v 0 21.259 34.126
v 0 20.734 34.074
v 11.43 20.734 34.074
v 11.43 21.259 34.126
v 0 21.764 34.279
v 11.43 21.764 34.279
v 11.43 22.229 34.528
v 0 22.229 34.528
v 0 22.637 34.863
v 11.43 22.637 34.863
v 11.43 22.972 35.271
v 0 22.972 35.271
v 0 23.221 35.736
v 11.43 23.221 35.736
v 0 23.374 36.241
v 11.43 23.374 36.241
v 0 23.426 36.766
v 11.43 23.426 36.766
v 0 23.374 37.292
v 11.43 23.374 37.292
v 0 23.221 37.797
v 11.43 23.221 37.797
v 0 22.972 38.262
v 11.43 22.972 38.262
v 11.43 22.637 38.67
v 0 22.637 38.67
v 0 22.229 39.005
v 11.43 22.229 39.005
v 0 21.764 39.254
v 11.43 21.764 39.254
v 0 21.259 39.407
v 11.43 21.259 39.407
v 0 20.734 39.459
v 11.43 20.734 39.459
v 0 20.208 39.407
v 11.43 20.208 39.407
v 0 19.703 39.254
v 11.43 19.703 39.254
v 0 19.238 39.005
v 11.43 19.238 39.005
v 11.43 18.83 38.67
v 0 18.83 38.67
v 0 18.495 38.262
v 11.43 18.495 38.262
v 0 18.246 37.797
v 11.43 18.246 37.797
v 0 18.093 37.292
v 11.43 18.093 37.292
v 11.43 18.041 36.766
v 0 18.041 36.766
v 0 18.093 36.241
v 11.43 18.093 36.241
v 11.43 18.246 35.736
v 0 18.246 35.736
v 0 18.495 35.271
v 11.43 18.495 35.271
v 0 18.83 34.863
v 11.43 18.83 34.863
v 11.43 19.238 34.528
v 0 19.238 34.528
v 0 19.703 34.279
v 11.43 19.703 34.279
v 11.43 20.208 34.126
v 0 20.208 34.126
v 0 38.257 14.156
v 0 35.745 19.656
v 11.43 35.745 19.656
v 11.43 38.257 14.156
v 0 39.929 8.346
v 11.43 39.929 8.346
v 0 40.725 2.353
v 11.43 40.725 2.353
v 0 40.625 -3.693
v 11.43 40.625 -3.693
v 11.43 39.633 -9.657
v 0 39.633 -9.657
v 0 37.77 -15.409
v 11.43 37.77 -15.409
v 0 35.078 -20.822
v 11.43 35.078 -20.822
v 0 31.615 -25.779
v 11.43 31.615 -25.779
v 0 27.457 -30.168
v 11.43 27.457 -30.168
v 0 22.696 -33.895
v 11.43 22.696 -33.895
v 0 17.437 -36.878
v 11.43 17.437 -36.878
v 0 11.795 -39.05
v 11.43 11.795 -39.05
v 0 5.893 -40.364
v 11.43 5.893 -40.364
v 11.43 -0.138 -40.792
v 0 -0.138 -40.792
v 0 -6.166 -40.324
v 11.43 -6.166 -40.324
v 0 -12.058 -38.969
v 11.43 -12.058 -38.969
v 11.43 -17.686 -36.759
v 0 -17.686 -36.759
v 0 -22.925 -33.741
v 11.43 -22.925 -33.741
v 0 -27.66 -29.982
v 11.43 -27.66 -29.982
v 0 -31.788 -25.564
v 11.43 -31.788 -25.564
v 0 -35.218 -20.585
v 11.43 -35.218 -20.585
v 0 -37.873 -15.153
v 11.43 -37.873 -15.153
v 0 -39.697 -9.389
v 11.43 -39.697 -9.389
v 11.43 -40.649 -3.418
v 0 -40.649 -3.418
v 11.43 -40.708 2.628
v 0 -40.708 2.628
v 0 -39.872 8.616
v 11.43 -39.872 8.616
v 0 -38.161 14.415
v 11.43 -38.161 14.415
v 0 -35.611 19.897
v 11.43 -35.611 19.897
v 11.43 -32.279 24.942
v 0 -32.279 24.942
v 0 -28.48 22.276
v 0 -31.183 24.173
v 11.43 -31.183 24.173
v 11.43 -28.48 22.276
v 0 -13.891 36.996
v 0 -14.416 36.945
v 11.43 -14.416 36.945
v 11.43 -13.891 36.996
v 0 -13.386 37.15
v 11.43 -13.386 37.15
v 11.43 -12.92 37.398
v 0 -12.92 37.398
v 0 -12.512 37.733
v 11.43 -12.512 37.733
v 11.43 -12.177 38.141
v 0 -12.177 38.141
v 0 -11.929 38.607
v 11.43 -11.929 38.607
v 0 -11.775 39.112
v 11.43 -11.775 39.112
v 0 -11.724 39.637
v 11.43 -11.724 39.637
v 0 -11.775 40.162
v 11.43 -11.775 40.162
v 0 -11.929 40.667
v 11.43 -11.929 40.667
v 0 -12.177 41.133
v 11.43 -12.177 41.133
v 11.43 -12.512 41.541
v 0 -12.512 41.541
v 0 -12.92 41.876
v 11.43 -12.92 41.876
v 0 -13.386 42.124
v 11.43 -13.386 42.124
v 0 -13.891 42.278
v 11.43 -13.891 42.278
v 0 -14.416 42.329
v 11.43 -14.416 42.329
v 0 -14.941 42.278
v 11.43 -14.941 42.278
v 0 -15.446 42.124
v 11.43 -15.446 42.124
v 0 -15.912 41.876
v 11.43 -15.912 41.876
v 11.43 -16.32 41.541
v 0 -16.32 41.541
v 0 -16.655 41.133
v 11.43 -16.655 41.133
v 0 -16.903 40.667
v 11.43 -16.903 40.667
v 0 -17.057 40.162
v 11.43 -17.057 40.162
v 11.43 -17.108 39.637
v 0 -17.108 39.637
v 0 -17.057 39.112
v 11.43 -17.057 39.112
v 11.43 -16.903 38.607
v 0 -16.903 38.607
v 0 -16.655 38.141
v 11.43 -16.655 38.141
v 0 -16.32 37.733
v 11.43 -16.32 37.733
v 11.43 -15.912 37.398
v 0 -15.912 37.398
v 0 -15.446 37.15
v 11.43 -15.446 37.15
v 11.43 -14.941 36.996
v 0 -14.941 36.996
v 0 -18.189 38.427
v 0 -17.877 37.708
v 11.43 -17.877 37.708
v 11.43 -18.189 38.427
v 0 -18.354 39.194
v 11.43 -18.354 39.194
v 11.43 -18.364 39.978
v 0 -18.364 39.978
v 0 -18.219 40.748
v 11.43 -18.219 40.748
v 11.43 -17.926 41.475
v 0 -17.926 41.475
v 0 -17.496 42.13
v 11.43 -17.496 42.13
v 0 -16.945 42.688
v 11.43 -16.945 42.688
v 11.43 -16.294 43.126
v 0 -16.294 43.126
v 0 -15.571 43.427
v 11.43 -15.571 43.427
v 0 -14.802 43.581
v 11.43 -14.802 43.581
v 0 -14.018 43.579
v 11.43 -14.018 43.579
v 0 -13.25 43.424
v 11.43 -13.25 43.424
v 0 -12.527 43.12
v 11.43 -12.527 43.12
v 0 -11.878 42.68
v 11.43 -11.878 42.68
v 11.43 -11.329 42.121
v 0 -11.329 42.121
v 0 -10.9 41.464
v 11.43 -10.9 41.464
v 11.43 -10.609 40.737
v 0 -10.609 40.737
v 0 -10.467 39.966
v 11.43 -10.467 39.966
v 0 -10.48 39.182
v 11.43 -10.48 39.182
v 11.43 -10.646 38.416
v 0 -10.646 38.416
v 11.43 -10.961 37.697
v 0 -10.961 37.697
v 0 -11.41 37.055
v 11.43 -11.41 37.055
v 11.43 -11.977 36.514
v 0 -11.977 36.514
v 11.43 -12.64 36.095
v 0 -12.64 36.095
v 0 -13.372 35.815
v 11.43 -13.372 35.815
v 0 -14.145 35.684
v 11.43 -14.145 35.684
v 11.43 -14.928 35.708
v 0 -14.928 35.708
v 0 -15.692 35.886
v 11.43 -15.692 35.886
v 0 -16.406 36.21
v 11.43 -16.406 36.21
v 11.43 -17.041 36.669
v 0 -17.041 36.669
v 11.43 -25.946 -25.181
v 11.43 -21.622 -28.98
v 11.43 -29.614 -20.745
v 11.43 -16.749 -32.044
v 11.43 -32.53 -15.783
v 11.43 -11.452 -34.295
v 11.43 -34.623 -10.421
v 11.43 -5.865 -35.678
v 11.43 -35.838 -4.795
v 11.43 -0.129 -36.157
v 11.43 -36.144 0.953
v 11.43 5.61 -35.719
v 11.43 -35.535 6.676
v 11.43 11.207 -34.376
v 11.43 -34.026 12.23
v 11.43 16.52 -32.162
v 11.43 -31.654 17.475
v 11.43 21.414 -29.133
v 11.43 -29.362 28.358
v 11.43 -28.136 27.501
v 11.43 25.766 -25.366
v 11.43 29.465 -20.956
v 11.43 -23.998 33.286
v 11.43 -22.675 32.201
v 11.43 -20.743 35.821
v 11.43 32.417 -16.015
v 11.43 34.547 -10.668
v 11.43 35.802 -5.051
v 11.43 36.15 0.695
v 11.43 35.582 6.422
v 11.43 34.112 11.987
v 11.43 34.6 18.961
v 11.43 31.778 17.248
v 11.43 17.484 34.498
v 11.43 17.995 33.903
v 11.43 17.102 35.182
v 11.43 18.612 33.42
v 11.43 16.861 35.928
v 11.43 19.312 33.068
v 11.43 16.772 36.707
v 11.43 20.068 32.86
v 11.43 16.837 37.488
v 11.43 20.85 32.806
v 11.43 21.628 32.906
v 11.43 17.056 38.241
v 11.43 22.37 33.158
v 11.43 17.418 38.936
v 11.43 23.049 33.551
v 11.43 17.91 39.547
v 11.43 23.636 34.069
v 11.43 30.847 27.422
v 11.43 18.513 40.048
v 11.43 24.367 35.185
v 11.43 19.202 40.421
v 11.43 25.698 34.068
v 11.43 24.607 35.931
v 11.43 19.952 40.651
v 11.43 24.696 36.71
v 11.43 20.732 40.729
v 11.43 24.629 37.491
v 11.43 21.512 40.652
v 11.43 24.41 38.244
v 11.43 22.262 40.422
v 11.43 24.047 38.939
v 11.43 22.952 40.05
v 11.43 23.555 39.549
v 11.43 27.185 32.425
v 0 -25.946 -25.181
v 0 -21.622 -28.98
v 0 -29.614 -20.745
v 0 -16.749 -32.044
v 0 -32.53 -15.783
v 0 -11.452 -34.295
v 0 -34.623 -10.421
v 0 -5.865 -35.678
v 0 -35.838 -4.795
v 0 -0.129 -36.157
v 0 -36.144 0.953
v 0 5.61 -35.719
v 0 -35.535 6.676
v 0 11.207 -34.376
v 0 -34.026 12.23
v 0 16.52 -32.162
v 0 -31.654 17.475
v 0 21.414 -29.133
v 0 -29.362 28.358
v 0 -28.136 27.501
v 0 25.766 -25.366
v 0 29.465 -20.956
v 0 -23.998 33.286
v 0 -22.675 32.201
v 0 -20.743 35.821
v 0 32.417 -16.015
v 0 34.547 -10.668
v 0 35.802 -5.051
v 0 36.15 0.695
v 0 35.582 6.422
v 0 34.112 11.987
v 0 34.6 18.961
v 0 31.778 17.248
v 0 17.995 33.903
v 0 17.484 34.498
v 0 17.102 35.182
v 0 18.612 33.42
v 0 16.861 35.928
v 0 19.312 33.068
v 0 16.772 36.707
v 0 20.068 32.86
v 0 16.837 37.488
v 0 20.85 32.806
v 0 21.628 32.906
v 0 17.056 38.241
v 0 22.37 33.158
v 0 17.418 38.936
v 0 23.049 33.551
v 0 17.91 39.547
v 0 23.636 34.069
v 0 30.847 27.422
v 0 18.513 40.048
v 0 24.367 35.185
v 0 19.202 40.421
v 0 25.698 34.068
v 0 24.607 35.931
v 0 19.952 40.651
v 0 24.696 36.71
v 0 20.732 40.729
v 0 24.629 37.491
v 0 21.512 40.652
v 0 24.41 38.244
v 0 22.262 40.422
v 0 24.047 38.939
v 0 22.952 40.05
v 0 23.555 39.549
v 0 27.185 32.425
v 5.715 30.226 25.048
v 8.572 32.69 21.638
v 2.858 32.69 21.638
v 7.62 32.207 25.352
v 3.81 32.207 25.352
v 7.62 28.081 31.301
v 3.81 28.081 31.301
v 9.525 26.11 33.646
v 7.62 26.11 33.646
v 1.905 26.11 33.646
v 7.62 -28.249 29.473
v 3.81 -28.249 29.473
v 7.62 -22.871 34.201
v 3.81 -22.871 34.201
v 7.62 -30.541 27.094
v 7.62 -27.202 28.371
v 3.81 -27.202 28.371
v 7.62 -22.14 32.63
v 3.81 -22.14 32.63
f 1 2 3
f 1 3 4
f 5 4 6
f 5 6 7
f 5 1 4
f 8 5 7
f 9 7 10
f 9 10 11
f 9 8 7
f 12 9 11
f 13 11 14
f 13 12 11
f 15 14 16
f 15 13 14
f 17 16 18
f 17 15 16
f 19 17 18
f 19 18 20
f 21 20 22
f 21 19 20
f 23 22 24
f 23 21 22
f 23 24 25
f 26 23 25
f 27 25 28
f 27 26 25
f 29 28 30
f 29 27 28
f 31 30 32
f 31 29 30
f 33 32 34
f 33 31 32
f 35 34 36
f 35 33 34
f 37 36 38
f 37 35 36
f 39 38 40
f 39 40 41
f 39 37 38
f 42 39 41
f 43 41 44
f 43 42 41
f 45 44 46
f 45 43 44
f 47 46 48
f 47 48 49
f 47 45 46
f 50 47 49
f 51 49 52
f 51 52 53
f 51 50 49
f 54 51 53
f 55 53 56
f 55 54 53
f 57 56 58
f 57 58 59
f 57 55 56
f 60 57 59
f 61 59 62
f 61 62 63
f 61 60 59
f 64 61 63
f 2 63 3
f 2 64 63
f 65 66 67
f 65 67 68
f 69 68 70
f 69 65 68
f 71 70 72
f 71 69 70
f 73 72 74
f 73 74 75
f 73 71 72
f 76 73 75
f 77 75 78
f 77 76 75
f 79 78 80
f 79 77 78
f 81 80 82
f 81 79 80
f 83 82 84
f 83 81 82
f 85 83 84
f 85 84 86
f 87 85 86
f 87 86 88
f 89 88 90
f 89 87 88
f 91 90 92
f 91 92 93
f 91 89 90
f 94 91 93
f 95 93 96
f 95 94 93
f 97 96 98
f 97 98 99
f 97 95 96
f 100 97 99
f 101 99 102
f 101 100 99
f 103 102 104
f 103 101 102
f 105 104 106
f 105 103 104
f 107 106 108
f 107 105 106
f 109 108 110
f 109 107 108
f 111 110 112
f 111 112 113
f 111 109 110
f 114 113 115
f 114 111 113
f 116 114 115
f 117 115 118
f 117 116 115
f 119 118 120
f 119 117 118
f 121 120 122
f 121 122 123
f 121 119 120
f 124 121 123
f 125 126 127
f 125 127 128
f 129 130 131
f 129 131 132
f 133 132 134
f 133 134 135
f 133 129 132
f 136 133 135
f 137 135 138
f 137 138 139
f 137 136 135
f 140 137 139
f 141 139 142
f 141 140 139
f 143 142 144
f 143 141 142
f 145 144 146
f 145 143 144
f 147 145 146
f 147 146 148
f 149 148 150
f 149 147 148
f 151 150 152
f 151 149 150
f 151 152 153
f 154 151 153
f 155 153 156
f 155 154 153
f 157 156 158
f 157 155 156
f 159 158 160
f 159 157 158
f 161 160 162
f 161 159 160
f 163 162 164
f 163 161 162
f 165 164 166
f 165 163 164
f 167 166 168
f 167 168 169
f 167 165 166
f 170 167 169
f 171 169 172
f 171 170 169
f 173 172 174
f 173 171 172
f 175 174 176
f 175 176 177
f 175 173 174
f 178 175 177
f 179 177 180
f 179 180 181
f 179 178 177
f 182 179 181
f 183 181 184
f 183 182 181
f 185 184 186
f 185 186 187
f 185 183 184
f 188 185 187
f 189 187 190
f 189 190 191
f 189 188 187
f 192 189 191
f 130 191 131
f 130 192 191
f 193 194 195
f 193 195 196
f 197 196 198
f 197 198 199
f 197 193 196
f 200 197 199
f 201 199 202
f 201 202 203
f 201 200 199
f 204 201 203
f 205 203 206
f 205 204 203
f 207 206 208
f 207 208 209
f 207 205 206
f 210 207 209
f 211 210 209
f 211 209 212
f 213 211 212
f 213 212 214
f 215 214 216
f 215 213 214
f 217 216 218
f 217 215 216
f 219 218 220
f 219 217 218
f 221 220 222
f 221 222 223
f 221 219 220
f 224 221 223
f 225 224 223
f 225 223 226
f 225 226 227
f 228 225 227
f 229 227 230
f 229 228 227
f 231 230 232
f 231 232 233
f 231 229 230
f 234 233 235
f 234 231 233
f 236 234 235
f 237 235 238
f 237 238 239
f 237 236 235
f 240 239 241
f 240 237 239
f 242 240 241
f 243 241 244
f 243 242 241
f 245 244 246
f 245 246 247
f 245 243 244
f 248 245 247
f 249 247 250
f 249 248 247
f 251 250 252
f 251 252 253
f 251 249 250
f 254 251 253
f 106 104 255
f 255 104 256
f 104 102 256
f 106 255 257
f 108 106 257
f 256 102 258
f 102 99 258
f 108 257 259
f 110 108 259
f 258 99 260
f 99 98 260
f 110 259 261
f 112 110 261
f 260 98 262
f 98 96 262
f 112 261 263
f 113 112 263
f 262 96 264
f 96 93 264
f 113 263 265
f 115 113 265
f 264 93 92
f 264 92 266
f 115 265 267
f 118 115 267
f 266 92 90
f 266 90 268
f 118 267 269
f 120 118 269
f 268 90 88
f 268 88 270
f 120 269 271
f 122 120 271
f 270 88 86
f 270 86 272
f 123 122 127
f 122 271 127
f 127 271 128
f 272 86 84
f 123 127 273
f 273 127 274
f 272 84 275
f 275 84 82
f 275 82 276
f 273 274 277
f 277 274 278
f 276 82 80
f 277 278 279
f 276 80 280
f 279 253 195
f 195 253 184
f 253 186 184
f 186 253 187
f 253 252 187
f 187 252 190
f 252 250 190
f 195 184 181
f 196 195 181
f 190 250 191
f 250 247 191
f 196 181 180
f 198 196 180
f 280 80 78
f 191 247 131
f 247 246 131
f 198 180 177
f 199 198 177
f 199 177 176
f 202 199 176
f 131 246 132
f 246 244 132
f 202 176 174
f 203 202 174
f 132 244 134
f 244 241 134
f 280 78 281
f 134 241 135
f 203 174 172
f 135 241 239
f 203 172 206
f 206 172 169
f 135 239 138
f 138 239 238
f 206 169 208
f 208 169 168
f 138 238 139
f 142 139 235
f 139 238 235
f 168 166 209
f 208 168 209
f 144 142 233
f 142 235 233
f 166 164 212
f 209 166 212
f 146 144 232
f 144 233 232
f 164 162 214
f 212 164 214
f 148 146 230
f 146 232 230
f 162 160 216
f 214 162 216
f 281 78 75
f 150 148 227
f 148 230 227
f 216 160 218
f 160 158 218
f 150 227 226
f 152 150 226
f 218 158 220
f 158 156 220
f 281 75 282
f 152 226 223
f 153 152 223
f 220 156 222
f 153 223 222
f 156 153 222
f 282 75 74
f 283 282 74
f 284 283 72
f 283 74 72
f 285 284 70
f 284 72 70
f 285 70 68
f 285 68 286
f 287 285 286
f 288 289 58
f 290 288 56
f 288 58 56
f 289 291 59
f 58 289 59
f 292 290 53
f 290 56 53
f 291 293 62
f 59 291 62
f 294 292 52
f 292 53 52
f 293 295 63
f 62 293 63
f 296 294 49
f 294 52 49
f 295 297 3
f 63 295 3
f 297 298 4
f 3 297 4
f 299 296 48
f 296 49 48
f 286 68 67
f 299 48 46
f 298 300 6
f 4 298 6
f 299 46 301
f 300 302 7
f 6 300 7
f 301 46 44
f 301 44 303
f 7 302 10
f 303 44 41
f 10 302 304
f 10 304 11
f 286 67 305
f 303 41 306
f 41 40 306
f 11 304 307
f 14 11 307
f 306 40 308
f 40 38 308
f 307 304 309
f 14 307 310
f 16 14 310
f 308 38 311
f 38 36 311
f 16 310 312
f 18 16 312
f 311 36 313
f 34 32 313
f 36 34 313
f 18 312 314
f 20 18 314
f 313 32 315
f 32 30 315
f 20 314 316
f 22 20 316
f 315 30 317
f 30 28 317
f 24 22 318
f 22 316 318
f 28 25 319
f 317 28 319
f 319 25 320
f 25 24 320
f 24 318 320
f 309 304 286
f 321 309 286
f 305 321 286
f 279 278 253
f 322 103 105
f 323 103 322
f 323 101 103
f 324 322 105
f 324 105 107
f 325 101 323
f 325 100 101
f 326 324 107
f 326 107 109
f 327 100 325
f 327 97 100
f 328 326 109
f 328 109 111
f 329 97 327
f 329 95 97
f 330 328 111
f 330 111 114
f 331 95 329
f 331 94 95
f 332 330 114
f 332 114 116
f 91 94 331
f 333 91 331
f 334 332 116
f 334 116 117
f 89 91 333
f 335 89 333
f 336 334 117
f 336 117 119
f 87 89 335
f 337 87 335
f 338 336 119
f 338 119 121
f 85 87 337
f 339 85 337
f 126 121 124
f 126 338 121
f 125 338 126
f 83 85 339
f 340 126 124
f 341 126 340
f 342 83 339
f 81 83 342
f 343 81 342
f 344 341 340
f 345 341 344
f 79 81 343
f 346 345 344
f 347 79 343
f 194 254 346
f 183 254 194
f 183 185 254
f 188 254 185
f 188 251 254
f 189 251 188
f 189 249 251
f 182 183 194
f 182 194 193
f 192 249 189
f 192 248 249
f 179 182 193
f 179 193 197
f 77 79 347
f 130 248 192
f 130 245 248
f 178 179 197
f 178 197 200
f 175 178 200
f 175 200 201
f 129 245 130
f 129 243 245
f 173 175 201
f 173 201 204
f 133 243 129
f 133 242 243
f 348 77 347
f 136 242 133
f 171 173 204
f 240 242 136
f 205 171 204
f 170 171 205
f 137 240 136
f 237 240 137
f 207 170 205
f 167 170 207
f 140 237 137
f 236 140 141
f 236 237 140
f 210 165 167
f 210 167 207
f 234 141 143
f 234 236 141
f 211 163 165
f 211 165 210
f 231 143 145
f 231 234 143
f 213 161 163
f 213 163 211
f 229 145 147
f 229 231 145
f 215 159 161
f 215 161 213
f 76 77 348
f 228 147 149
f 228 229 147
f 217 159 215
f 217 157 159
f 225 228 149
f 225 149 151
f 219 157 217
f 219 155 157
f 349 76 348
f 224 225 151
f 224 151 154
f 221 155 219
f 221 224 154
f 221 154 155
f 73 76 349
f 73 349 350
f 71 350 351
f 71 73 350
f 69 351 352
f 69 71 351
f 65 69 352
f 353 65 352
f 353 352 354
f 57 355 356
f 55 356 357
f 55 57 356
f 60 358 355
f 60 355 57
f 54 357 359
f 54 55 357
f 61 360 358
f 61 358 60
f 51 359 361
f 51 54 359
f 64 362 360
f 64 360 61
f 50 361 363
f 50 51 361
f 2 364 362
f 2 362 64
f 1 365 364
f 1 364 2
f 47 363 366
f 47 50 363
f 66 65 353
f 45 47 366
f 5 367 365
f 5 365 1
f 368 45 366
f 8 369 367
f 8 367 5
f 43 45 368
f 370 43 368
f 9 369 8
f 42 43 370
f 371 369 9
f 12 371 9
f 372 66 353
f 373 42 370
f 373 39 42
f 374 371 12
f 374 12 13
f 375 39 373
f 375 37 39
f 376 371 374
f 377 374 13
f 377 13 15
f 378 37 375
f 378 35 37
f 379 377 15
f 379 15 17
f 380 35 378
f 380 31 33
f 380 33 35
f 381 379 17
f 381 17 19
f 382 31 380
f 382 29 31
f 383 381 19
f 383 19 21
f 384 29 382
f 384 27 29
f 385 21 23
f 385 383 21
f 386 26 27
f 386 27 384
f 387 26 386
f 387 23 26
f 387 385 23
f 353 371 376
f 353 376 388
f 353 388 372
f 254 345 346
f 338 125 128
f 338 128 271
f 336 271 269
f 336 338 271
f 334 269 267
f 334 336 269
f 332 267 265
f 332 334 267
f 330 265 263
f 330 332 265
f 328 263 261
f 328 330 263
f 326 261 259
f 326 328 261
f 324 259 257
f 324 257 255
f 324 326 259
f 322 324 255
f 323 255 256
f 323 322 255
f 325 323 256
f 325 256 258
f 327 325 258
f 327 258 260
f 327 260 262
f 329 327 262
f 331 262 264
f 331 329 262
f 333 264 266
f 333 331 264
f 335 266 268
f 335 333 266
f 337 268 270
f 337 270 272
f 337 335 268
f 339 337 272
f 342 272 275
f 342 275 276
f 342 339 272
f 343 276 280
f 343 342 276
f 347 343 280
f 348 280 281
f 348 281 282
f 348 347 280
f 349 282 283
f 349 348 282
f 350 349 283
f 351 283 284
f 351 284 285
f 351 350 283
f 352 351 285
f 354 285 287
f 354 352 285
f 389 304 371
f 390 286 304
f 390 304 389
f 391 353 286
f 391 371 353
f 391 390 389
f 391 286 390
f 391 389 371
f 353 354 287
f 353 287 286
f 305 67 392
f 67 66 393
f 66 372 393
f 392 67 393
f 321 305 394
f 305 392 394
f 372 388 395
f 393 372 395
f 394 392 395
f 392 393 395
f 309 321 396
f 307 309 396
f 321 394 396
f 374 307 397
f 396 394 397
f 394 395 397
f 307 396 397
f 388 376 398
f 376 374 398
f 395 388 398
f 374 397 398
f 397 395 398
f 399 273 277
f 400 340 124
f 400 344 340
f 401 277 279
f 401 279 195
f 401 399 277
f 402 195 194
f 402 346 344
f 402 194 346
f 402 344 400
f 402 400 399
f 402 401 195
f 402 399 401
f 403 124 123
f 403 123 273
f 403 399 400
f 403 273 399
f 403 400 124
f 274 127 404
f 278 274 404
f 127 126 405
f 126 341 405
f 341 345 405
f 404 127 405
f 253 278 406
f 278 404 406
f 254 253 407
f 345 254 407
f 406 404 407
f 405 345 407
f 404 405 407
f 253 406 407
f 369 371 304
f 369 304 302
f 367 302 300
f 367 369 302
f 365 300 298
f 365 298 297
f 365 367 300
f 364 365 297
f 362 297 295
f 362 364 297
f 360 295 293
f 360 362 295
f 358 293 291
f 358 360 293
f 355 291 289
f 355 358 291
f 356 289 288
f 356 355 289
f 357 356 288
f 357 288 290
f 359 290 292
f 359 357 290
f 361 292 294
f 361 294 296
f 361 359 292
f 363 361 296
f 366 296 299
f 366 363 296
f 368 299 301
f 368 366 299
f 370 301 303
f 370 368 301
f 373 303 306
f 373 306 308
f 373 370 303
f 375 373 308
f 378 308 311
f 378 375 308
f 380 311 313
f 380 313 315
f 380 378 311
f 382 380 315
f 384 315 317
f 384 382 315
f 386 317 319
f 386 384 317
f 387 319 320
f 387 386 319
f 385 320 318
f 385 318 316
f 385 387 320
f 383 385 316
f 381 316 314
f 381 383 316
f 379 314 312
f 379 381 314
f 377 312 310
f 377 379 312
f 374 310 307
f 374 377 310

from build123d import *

# Parameters (mm, degrees)
SKETCH1_R           = 2.6924
BOSS_EXTRUDE1_DEPTH = 11.43


with BuildPart() as part:
    # Sketch1 → Boss-Extrude1 (new body)
    with BuildSketch(Plane(origin=(0, 0, 0), x_dir=(0, 0, -1), z_dir=(1, 0, 0))):
        with BuildLine():
            Line((-17.248379124, 31.777583848), (-18.961429782, 34.60046561))
            add(Edge.make_bspline(
                [(-18.961429782, 34.60046561), (-23.58056, 31.333147995), (-34.069402621, 23.636456001)],
                knots=[0, 0, 0, 1, 1, 1], degree=2))
            ThreePointArc((-34.069402621, 23.636456001), (-38.936367326, 17.418147401), (-35.185150313, 24.366750009))
            add(Edge.make_bspline(
                [(-19.655711627, 35.744550608), (-24.45282225, 32.833449755), (-33.10684296, 27.542000808), (-35.185150313, 24.366750009)],
                knots=[0, 0, 0, 0, 1, 1, 1, 1], degree=3))
            ThreePointArc((-19.655711627, 35.744550608), (40.669779942, -3.160521672), (-24.941927486, -32.278787942))
            add(Edge.make_bspline(
                [(-24.941927486, -32.278787942), (-28.90001234, -29.501694158), (-35.285813522, -22.100360431), (-37.707971273, -17.877142062)],
                knots=[0, 0, 0, 0, 1, 1, 1, 1], degree=3))
            ThreePointArc((-37.707971273, -17.877142062), (-42.120851326, -11.328768455), (-36.669004411, -17.041217359))
            add(Edge.make_bspline(
                [(-24.172835506, -31.182630753), (-28.247821961, -28.091199741), (-32.832203399, -21.809959197), (-36.669004411, -17.041217359)],
                knots=[0, 0, 0, 0, 1, 1, 1, 1], degree=3))
            Line((-24.172835506, -31.182630753), (-22.276314881, -28.479592921))
            ThreePointArc((-22.276314881, -28.479592921), (36.03168324, -3.006529649), (-17.248379124, 31.777583848))
        make_face()
        with Locations((-36.766350845, 20.733511971)):
            Circle(SKETCH1_R, mode=Mode.SUBTRACT)
        with Locations((-39.636960779, -14.415984273)):
            Circle(SKETCH1_R, mode=Mode.SUBTRACT)
    extrude(amount=BOSS_EXTRUDE1_DEPTH)


solid = part.part
